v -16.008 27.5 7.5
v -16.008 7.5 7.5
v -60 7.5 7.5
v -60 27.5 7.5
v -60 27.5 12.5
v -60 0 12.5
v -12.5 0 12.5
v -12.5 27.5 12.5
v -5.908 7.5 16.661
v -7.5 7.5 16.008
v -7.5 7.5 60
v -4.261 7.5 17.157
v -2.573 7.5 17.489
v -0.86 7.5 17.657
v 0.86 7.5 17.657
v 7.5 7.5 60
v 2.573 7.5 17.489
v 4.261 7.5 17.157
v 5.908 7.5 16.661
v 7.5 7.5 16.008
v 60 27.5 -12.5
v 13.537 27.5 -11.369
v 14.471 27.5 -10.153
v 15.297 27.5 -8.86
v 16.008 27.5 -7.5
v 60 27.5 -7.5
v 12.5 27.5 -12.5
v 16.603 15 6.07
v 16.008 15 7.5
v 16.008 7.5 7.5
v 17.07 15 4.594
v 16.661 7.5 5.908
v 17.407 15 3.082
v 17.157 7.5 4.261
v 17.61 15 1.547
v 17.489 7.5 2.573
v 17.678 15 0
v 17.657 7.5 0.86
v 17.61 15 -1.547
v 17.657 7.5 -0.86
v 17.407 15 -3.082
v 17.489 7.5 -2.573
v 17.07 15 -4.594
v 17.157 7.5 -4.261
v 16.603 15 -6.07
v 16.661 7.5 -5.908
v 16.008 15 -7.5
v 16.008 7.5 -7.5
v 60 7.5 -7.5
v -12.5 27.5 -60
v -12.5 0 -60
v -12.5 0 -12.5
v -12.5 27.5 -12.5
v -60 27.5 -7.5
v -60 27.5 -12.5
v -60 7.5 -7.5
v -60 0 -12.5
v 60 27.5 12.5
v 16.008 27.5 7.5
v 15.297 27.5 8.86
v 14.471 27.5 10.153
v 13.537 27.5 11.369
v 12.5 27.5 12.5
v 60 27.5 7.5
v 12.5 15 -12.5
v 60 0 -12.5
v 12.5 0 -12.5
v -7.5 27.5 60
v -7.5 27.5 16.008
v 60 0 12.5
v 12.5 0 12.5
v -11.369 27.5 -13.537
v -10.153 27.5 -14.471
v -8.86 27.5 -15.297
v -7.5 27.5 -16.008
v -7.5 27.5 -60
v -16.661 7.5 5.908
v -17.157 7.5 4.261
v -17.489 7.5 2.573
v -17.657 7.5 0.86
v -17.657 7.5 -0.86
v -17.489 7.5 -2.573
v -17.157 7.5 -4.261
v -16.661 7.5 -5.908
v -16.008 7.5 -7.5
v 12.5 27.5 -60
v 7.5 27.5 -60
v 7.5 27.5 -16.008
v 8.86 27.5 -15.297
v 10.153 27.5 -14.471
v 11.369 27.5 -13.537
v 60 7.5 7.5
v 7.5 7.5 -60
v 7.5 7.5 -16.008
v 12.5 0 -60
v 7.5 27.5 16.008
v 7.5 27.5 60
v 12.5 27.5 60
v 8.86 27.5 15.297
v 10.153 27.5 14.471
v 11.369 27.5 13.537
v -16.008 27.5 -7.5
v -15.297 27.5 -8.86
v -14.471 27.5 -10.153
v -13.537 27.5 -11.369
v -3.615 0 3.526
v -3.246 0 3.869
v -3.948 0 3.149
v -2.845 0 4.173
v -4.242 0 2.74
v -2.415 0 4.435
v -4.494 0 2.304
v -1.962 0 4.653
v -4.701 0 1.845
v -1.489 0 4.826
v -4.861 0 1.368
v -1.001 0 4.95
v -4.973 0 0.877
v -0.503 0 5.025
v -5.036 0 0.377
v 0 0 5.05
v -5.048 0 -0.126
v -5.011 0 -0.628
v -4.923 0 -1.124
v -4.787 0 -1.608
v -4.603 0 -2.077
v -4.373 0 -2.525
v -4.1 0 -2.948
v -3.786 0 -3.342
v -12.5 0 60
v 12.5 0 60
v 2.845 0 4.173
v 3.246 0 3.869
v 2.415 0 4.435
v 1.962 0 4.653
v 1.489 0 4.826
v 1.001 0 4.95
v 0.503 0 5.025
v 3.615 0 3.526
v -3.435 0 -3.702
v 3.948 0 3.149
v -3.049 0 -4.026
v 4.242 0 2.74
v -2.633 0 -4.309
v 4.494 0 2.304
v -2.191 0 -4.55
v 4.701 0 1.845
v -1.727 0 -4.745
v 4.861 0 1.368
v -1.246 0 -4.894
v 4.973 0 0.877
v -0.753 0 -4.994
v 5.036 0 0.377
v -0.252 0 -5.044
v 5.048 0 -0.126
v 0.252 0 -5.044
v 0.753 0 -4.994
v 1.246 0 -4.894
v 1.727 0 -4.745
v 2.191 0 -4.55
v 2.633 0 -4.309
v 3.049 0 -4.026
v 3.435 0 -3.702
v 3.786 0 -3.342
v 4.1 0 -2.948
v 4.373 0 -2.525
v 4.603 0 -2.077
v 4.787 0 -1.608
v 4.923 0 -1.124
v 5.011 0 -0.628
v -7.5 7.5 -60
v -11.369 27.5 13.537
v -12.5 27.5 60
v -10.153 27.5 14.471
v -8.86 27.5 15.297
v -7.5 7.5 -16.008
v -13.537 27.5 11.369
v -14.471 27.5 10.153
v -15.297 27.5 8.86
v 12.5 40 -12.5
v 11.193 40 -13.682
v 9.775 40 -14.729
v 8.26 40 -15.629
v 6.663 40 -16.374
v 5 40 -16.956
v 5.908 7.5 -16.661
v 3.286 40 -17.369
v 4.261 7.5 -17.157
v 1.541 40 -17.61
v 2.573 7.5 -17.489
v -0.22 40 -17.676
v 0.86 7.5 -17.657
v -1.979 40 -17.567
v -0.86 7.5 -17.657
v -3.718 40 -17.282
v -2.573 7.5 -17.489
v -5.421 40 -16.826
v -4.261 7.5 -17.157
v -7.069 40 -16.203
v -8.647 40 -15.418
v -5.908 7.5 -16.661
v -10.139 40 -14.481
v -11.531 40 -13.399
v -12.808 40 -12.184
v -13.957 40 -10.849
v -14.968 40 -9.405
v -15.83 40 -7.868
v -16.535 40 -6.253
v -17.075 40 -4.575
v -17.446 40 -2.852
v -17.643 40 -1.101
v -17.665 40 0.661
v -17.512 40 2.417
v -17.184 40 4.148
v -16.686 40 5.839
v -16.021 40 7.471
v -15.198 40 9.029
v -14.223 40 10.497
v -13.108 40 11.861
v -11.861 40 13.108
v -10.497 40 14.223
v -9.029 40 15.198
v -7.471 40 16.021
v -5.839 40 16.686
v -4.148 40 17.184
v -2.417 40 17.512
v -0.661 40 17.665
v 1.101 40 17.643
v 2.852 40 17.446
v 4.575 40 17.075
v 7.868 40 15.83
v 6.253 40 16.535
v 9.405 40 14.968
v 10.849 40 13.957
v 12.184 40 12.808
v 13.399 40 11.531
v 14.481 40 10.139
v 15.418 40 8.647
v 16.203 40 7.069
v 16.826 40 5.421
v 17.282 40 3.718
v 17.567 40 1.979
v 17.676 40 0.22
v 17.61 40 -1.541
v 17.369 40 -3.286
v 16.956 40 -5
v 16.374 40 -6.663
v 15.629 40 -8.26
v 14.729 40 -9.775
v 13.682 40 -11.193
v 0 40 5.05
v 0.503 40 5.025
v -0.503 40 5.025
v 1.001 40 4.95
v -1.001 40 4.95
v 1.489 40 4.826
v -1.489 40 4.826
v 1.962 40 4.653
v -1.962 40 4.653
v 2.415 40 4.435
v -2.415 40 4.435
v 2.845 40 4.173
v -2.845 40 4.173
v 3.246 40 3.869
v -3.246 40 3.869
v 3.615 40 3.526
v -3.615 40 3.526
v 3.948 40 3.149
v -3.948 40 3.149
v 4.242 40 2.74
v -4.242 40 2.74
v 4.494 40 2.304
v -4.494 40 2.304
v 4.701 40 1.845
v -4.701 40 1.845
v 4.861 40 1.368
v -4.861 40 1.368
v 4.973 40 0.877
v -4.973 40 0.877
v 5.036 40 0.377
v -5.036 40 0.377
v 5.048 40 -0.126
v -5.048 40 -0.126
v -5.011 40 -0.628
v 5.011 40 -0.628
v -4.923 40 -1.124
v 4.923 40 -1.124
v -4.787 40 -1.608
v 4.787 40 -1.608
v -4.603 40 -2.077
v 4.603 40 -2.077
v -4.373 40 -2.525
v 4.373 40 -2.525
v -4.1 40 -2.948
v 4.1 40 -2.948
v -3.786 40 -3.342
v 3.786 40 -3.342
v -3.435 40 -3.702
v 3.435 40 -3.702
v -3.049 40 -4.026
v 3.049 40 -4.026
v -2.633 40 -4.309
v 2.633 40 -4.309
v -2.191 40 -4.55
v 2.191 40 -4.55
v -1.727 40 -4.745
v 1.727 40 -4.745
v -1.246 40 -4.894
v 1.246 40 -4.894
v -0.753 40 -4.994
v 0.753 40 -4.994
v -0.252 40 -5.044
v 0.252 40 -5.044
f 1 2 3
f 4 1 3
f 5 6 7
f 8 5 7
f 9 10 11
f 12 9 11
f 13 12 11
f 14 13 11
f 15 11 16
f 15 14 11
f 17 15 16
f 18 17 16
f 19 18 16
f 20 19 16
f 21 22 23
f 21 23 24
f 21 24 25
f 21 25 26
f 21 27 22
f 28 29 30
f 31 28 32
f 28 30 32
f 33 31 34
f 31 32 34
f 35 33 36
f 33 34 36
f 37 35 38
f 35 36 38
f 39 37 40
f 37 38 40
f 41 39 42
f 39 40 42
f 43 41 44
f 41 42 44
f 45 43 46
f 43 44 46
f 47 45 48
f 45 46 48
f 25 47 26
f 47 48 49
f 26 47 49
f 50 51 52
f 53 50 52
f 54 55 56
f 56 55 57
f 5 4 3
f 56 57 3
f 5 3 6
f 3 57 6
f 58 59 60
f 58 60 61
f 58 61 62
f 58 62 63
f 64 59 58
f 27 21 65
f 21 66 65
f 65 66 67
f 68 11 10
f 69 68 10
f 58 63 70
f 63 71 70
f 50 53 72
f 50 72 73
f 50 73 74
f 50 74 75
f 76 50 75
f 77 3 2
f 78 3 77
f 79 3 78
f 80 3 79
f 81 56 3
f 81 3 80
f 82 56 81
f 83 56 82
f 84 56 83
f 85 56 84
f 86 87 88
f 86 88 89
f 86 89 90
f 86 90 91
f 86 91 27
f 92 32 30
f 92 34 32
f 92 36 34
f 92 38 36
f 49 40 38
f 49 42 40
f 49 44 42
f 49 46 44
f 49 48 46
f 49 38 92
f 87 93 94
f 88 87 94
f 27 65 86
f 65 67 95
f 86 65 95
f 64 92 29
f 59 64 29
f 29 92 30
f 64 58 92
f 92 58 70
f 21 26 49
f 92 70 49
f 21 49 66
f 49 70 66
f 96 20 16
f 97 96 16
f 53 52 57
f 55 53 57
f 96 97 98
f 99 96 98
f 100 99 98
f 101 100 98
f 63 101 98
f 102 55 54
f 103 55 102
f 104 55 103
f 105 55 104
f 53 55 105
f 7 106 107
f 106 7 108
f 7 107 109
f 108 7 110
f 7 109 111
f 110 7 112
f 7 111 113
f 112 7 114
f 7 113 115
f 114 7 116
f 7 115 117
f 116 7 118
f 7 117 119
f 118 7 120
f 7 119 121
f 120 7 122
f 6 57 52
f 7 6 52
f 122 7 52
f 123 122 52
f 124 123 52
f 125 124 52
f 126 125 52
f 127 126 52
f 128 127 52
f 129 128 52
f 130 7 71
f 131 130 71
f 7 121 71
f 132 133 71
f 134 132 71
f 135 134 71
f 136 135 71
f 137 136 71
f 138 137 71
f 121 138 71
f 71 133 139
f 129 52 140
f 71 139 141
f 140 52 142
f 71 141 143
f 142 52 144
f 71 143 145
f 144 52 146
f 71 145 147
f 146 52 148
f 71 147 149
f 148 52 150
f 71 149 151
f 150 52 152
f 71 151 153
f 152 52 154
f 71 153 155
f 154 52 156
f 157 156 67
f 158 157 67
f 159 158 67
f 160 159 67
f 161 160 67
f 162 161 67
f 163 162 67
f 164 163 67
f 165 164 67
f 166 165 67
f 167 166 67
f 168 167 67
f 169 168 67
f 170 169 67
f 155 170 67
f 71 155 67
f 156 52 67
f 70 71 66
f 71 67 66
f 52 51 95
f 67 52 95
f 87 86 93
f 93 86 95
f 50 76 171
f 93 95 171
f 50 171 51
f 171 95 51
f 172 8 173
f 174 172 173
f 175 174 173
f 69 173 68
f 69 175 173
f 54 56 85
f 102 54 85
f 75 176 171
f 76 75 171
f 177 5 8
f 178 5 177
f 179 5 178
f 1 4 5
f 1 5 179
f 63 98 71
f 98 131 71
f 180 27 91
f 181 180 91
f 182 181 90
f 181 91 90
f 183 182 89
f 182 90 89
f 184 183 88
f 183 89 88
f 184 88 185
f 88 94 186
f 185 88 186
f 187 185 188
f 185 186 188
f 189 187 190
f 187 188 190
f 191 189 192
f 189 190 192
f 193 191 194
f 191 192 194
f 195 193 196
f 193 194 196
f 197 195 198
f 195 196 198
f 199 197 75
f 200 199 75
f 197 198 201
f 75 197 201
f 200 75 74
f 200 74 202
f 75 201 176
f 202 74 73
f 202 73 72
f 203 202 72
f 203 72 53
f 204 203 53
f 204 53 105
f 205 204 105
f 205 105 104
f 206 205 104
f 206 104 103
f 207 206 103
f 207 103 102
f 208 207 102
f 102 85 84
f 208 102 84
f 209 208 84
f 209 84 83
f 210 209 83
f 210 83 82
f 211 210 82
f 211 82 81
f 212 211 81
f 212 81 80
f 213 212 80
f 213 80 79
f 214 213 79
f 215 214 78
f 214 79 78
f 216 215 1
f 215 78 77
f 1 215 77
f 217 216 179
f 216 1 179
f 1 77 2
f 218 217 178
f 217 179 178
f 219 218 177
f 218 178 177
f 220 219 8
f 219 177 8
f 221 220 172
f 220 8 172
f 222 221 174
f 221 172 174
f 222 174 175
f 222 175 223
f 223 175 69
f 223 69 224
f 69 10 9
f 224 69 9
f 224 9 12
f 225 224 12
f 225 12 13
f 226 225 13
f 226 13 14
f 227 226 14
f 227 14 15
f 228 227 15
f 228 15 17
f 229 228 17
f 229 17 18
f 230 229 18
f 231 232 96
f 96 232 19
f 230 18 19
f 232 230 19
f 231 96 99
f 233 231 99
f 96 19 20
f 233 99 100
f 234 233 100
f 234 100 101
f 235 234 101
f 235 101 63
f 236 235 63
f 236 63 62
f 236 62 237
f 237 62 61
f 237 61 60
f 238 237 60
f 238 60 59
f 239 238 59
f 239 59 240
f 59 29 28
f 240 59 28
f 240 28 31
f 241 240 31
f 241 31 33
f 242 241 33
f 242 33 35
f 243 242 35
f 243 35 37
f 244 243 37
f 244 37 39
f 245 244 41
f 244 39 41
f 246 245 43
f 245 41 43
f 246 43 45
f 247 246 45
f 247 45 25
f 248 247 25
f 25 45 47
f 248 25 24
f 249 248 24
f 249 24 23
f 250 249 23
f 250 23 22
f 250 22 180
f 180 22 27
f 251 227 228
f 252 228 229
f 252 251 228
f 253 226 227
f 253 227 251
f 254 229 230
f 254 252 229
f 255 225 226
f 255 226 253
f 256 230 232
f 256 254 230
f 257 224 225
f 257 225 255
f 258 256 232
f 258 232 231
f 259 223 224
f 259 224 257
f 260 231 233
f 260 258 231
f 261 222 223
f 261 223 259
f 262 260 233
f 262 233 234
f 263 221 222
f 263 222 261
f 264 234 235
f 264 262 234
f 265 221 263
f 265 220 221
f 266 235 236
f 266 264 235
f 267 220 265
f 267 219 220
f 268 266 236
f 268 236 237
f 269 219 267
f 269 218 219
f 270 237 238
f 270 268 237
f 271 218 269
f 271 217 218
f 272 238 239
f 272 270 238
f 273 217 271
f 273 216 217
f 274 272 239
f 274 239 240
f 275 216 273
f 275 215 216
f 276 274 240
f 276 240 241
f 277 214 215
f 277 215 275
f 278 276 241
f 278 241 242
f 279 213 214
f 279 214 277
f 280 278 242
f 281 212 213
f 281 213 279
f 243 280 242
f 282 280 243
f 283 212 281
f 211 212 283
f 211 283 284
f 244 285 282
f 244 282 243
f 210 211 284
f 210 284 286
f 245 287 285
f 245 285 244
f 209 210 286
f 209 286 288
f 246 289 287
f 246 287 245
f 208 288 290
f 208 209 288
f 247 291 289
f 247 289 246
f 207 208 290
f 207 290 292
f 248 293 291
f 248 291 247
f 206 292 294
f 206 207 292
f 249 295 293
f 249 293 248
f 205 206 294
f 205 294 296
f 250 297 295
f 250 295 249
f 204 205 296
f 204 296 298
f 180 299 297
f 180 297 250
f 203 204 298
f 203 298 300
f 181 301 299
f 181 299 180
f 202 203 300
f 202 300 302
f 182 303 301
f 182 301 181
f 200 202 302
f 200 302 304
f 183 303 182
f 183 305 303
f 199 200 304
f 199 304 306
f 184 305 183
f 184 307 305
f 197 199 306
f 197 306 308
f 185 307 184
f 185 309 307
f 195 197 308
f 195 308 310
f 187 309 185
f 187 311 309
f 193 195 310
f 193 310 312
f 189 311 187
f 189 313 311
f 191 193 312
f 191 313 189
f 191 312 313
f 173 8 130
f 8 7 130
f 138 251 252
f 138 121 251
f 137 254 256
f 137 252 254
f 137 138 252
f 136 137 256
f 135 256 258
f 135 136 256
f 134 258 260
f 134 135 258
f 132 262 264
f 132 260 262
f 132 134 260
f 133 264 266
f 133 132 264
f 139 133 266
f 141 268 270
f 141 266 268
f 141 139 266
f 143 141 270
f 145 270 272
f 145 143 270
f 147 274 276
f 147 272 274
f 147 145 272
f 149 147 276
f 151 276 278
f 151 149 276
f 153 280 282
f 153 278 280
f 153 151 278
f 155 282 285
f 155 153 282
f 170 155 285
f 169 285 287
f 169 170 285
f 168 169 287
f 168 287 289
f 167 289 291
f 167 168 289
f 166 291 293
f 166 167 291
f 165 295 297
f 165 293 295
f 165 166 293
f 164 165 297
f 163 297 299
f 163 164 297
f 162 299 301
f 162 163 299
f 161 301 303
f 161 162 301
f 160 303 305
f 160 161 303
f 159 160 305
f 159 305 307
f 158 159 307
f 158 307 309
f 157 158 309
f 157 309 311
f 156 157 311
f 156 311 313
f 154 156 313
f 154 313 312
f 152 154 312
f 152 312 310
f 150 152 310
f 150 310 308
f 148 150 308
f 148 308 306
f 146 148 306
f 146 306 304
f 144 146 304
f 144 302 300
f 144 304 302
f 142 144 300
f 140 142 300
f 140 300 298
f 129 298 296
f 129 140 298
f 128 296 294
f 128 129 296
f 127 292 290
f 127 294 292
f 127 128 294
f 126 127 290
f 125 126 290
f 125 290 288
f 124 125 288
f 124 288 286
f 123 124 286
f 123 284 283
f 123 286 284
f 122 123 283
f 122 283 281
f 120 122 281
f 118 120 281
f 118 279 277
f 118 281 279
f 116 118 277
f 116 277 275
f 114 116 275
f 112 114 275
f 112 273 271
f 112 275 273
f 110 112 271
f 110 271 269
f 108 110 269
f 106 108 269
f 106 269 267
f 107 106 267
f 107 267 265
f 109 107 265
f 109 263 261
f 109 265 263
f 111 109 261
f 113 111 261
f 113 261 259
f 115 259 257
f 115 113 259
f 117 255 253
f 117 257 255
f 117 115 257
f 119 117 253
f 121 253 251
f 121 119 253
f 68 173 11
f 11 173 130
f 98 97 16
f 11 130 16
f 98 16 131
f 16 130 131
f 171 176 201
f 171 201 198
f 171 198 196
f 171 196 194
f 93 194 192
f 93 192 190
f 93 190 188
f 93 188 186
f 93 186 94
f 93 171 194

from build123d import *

# Parameters (mm, degrees)
BOSS_EXTRUDE1_DEPTH     = 7.5
BOSS_EXTRUDE1_2_DEPTH   = 7.5
BOSS_EXTRUDE1_3_DEPTH   = 7.5
BOSS_EXTRUDE1_4_DEPTH   = 7.5
SKETCH1_3_W             = 25
SKETCH1_3_H             = 25
SKETCH1_3_R             = 5.05
BOSS_EXTRUDE2_DEPTH     = 15
BOSS_EXTRUDE5_DEPTH     = 7.5
BOSS_EXTRUDE8_DEPTH     = 15
SKETCH1_8_R             = 17.67766953
BOSS_EXTRUDE9_DEPTH     = 40
BOSS_EXTRUDE10_DEPTH    = 20
CUT_EXTRUDE1_DEPTH      = 94.808315196
CUT_EXTRUDE1_DEPTH_BACK = 94.808315196
SKETCH1_9_R             = 5.05


# Read off the part's stored shape, not the designer's step: Boss-Extrude5
with BuildPart() as part:
    # Sketch1 → Boss-Extrude1 (new body)
    with BuildSketch(Plane(origin=(0, 0, 0), x_dir=(1, 0, 0), z_dir=(0, 1, 0))):
        with BuildLine():
            Line((-60, 12.5), (-60, -12.5))
            Line((-60, -12.5), (-12.5, -12.5))
            ThreePointArc((-12.5, -12.5), (-17.67766953, 0), (-12.5, 12.5))
            Line((-12.5, 12.5), (-60, 12.5))
        make_face()
    extrude(amount=BOSS_EXTRUDE1_DEPTH)



with BuildPart() as body_2:
    # Sketch1 → Boss-Extrude1 2 (new body)
    with BuildSketch(Plane(origin=(0, 0, 0), x_dir=(1, 0, 0), z_dir=(0, 1, 0))):
        with BuildLine():
            ThreePointArc((12.5, -12.5), (0, -17.67766953), (-12.5, -12.5))
            Line((-12.5, -12.5), (-12.5, -60))
            Line((-12.5, -60), (12.5, -60))
            Line((12.5, -60), (12.5, -12.5))
        make_face()
    extrude(amount=BOSS_EXTRUDE1_2_DEPTH)


with BuildPart() as body_3:
    # Sketch1 → Boss-Extrude1 3 (new body)
    with BuildSketch(Plane(origin=(0, 0, 0), x_dir=(1, 0, 0), z_dir=(0, 1, 0))):
        with BuildLine():
            ThreePointArc((12.5, 12.5), (17.67766953, 0), (12.5, -12.5))
            Line((12.5, -12.5), (60, -12.5))
            Line((60, -12.5), (60, 12.5))
            Line((60, 12.5), (12.5, 12.5))
        make_face()
    extrude(amount=BOSS_EXTRUDE1_3_DEPTH)


with BuildPart() as body_4:
    # Sketch1 → Boss-Extrude1 4 (new body)
    with BuildSketch(Plane(origin=(0, 0, 0), x_dir=(1, 0, 0), z_dir=(0, 1, 0))):
        with BuildLine():
            Line((-12.5, 60), (-12.5, 12.5))
            ThreePointArc((-12.5, 12.5), (0, 17.67766953), (12.5, 12.5))
            Line((12.5, 12.5), (12.5, 60))
            Line((12.5, 60), (-12.5, 60))
        make_face()
    extrude(amount=BOSS_EXTRUDE1_4_DEPTH)


with BuildPart() as body_5:
    # Sketch1<3> → Boss-Extrude2 (new body)
    with BuildSketch(Plane(origin=(0, 0, 0), x_dir=(1, 0, 0), z_dir=(0, 1, 0))):
        Rectangle(SKETCH1_3_W, SKETCH1_3_H)
        with Locations(Location((0, 0, 0), (0, 0, 270))):
            Circle(SKETCH1_3_R, mode=Mode.SUBTRACT)
    extrude(amount=BOSS_EXTRUDE2_DEPTH)


with BuildPart() as body_6:
    # Boss-Extrude5 outline → Boss-Extrude5 (new body)
    with BuildSketch(Plane(origin=(0, 0, 0), x_dir=(1, 0, 0), z_dir=(0, 1, 0))):
        with BuildLine():
            Line((-12.5, 60), (-12.5, 12.5))
            ThreePointArc((-12.5, 12.5), (0, 17.67766953), (12.5, 12.5))
            Line((12.5, 12.5), (12.5, 60))
            Line((12.5, 60), (-12.5, 60))
        make_face()
    extrude(amount=BOSS_EXTRUDE5_DEPTH)


with BuildPart() as part_1:
    add(part.part)

    add(body_2.part)  # Boss-Extrude8 merges body 2

    add(body_3.part)  # Boss-Extrude8 merges body 3

    add(body_4.part)  # Boss-Extrude8 merges body 4

    add(body_5.part)  # Boss-Extrude8 merges body 5

    add(body_6.part)  # Boss-Extrude8 merges body 6
    # Sketch1<7> → Boss-Extrude8 (add)
    with BuildSketch(Plane(origin=(0, 0, 0), x_dir=(1, 0, 0), z_dir=(0, 1, 0))):
        with BuildLine():
            ThreePointArc((-12.5, 12.5), (-17.67766953, 0), (-12.5, -12.5))
            Line((-12.5, -12.5), (-12.5, 12.5))
        make_face()
        with BuildLine():
            Line((12.5, -12.5), (-12.5, -12.5))
            ThreePointArc((-12.5, -12.5), (0, -17.67766953), (12.5, -12.5))
        make_face()
        with BuildLine():
            Line((12.5, 12.5), (12.5, -12.5))
            ThreePointArc((12.5, -12.5), (16.332037061, -6.764951252), (17.67766953, 0))
            ThreePointArc((17.67766953, 0), (16.332037061, 6.764951252), (12.5, 12.5))
        make_face()
        with BuildLine():
            ThreePointArc((12.5, 12.5), (0, 17.67766953), (-12.5, 12.5))
            Line((-12.5, 12.5), (12.5, 12.5))
        make_face()
    extrude(amount=BOSS_EXTRUDE8_DEPTH)

    # Sketch1<8> → Boss-Extrude9 (add)
    with BuildSketch(Plane(origin=(0, 0, 0), x_dir=(1, 0, 0), z_dir=(0, 1, 0))):
        with Locations(Location((0, 0, 0), (0, 0, 45))):
            Circle(SKETCH1_8_R)
    extrude(amount=BOSS_EXTRUDE9_DEPTH)

    # Sketch5 → Boss-Extrude10 (add)
    with BuildSketch(Plane(origin=(0, 7.5, 0), x_dir=(1, 0, 0), z_dir=(0, 1, 0))):
        with BuildLine():
            Line((-60, 7.5), (-16.007810594, 7.5))
            ThreePointArc((-16.007810594, 7.5), (-14.471482861, 10.152644177), (-12.5, 12.5))
            Line((-12.5, 12.5), (-60, 12.5))
            Line((-60, 12.5), (-60, 7.5))
        make_face()
        with BuildLine():
            Line((-12.5, 60), (-12.5, 12.5))
            ThreePointArc((-12.5, 12.5), (-10.152644177, 14.471482861), (-7.5, 16.007810594))
            Line((-7.5, 16.007810594), (-7.5, 60))
            Line((-7.5, 60), (-12.5, 60))
        make_face()
        with BuildLine():
            Line((7.5, 60), (7.5, 16.007810594))
            ThreePointArc((7.5, 16.007810594), (10.152644177, 14.471482861), (12.5, 12.5))
            Line((12.5, 12.5), (12.5, 60))
            Line((12.5, 60), (7.5, 60))
        make_face()
        with BuildLine():
            ThreePointArc((12.5, 12.5), (14.471482861, 10.152644177), (16.007810594, 7.5))
            Line((16.007810594, 7.5), (60, 7.5))
            Line((60, 7.5), (60, 12.5))
            Line((60, 12.5), (12.5, 12.5))
        make_face()
        with BuildLine():
            ThreePointArc((16.007810594, -7.5), (14.471482861, -10.152644177), (12.5, -12.5))
            Line((12.5, -12.5), (60, -12.5))
            Line((60, -12.5), (60, -7.5))
            Line((60, -7.5), (16.007810594, -7.5))
        make_face()
        with BuildLine():
            ThreePointArc((12.5, -12.5), (10.152644177, -14.471482861), (7.5, -16.007810594))
            Line((7.5, -16.007810594), (7.5, -60))
            Line((7.5, -60), (12.5, -60))
            Line((12.5, -60), (12.5, -12.5))
        make_face()
        with BuildLine():
            ThreePointArc((-7.5, -16.007810594), (-10.152644177, -14.471482861), (-12.5, -12.5))
            Line((-12.5, -12.5), (-12.5, -60))
            Line((-12.5, -60), (-7.5, -60))
            Line((-7.5, -60), (-7.5, -16.007810594))
        make_face()
        with BuildLine():
            Line((-60, -12.5), (-12.5, -12.5))
            ThreePointArc((-12.5, -12.5), (-14.471482861, -10.152644177), (-16.007810594, -7.5))
            Line((-16.007810594, -7.5), (-60, -7.5))
            Line((-60, -7.5), (-60, -12.5))
        make_face()
    extrude(amount=BOSS_EXTRUDE10_DEPTH)

    # Sketch1<9> → Cut-Extrude1 (cut, two sides: drawn at the far end of the back side and taken through both)
    with BuildSketch(Plane(origin=(0, 0, 0), x_dir=(1, 0, 0), z_dir=(0, 1, 0)).offset(-CUT_EXTRUDE1_DEPTH_BACK)):
        with Locations(Location((0, 0, 0), (0, 0, 270))):
            Circle(SKETCH1_9_R)
    extrude(amount=CUT_EXTRUDE1_DEPTH + CUT_EXTRUDE1_DEPTH_BACK, mode=Mode.SUBTRACT)


solid = part_1.part
